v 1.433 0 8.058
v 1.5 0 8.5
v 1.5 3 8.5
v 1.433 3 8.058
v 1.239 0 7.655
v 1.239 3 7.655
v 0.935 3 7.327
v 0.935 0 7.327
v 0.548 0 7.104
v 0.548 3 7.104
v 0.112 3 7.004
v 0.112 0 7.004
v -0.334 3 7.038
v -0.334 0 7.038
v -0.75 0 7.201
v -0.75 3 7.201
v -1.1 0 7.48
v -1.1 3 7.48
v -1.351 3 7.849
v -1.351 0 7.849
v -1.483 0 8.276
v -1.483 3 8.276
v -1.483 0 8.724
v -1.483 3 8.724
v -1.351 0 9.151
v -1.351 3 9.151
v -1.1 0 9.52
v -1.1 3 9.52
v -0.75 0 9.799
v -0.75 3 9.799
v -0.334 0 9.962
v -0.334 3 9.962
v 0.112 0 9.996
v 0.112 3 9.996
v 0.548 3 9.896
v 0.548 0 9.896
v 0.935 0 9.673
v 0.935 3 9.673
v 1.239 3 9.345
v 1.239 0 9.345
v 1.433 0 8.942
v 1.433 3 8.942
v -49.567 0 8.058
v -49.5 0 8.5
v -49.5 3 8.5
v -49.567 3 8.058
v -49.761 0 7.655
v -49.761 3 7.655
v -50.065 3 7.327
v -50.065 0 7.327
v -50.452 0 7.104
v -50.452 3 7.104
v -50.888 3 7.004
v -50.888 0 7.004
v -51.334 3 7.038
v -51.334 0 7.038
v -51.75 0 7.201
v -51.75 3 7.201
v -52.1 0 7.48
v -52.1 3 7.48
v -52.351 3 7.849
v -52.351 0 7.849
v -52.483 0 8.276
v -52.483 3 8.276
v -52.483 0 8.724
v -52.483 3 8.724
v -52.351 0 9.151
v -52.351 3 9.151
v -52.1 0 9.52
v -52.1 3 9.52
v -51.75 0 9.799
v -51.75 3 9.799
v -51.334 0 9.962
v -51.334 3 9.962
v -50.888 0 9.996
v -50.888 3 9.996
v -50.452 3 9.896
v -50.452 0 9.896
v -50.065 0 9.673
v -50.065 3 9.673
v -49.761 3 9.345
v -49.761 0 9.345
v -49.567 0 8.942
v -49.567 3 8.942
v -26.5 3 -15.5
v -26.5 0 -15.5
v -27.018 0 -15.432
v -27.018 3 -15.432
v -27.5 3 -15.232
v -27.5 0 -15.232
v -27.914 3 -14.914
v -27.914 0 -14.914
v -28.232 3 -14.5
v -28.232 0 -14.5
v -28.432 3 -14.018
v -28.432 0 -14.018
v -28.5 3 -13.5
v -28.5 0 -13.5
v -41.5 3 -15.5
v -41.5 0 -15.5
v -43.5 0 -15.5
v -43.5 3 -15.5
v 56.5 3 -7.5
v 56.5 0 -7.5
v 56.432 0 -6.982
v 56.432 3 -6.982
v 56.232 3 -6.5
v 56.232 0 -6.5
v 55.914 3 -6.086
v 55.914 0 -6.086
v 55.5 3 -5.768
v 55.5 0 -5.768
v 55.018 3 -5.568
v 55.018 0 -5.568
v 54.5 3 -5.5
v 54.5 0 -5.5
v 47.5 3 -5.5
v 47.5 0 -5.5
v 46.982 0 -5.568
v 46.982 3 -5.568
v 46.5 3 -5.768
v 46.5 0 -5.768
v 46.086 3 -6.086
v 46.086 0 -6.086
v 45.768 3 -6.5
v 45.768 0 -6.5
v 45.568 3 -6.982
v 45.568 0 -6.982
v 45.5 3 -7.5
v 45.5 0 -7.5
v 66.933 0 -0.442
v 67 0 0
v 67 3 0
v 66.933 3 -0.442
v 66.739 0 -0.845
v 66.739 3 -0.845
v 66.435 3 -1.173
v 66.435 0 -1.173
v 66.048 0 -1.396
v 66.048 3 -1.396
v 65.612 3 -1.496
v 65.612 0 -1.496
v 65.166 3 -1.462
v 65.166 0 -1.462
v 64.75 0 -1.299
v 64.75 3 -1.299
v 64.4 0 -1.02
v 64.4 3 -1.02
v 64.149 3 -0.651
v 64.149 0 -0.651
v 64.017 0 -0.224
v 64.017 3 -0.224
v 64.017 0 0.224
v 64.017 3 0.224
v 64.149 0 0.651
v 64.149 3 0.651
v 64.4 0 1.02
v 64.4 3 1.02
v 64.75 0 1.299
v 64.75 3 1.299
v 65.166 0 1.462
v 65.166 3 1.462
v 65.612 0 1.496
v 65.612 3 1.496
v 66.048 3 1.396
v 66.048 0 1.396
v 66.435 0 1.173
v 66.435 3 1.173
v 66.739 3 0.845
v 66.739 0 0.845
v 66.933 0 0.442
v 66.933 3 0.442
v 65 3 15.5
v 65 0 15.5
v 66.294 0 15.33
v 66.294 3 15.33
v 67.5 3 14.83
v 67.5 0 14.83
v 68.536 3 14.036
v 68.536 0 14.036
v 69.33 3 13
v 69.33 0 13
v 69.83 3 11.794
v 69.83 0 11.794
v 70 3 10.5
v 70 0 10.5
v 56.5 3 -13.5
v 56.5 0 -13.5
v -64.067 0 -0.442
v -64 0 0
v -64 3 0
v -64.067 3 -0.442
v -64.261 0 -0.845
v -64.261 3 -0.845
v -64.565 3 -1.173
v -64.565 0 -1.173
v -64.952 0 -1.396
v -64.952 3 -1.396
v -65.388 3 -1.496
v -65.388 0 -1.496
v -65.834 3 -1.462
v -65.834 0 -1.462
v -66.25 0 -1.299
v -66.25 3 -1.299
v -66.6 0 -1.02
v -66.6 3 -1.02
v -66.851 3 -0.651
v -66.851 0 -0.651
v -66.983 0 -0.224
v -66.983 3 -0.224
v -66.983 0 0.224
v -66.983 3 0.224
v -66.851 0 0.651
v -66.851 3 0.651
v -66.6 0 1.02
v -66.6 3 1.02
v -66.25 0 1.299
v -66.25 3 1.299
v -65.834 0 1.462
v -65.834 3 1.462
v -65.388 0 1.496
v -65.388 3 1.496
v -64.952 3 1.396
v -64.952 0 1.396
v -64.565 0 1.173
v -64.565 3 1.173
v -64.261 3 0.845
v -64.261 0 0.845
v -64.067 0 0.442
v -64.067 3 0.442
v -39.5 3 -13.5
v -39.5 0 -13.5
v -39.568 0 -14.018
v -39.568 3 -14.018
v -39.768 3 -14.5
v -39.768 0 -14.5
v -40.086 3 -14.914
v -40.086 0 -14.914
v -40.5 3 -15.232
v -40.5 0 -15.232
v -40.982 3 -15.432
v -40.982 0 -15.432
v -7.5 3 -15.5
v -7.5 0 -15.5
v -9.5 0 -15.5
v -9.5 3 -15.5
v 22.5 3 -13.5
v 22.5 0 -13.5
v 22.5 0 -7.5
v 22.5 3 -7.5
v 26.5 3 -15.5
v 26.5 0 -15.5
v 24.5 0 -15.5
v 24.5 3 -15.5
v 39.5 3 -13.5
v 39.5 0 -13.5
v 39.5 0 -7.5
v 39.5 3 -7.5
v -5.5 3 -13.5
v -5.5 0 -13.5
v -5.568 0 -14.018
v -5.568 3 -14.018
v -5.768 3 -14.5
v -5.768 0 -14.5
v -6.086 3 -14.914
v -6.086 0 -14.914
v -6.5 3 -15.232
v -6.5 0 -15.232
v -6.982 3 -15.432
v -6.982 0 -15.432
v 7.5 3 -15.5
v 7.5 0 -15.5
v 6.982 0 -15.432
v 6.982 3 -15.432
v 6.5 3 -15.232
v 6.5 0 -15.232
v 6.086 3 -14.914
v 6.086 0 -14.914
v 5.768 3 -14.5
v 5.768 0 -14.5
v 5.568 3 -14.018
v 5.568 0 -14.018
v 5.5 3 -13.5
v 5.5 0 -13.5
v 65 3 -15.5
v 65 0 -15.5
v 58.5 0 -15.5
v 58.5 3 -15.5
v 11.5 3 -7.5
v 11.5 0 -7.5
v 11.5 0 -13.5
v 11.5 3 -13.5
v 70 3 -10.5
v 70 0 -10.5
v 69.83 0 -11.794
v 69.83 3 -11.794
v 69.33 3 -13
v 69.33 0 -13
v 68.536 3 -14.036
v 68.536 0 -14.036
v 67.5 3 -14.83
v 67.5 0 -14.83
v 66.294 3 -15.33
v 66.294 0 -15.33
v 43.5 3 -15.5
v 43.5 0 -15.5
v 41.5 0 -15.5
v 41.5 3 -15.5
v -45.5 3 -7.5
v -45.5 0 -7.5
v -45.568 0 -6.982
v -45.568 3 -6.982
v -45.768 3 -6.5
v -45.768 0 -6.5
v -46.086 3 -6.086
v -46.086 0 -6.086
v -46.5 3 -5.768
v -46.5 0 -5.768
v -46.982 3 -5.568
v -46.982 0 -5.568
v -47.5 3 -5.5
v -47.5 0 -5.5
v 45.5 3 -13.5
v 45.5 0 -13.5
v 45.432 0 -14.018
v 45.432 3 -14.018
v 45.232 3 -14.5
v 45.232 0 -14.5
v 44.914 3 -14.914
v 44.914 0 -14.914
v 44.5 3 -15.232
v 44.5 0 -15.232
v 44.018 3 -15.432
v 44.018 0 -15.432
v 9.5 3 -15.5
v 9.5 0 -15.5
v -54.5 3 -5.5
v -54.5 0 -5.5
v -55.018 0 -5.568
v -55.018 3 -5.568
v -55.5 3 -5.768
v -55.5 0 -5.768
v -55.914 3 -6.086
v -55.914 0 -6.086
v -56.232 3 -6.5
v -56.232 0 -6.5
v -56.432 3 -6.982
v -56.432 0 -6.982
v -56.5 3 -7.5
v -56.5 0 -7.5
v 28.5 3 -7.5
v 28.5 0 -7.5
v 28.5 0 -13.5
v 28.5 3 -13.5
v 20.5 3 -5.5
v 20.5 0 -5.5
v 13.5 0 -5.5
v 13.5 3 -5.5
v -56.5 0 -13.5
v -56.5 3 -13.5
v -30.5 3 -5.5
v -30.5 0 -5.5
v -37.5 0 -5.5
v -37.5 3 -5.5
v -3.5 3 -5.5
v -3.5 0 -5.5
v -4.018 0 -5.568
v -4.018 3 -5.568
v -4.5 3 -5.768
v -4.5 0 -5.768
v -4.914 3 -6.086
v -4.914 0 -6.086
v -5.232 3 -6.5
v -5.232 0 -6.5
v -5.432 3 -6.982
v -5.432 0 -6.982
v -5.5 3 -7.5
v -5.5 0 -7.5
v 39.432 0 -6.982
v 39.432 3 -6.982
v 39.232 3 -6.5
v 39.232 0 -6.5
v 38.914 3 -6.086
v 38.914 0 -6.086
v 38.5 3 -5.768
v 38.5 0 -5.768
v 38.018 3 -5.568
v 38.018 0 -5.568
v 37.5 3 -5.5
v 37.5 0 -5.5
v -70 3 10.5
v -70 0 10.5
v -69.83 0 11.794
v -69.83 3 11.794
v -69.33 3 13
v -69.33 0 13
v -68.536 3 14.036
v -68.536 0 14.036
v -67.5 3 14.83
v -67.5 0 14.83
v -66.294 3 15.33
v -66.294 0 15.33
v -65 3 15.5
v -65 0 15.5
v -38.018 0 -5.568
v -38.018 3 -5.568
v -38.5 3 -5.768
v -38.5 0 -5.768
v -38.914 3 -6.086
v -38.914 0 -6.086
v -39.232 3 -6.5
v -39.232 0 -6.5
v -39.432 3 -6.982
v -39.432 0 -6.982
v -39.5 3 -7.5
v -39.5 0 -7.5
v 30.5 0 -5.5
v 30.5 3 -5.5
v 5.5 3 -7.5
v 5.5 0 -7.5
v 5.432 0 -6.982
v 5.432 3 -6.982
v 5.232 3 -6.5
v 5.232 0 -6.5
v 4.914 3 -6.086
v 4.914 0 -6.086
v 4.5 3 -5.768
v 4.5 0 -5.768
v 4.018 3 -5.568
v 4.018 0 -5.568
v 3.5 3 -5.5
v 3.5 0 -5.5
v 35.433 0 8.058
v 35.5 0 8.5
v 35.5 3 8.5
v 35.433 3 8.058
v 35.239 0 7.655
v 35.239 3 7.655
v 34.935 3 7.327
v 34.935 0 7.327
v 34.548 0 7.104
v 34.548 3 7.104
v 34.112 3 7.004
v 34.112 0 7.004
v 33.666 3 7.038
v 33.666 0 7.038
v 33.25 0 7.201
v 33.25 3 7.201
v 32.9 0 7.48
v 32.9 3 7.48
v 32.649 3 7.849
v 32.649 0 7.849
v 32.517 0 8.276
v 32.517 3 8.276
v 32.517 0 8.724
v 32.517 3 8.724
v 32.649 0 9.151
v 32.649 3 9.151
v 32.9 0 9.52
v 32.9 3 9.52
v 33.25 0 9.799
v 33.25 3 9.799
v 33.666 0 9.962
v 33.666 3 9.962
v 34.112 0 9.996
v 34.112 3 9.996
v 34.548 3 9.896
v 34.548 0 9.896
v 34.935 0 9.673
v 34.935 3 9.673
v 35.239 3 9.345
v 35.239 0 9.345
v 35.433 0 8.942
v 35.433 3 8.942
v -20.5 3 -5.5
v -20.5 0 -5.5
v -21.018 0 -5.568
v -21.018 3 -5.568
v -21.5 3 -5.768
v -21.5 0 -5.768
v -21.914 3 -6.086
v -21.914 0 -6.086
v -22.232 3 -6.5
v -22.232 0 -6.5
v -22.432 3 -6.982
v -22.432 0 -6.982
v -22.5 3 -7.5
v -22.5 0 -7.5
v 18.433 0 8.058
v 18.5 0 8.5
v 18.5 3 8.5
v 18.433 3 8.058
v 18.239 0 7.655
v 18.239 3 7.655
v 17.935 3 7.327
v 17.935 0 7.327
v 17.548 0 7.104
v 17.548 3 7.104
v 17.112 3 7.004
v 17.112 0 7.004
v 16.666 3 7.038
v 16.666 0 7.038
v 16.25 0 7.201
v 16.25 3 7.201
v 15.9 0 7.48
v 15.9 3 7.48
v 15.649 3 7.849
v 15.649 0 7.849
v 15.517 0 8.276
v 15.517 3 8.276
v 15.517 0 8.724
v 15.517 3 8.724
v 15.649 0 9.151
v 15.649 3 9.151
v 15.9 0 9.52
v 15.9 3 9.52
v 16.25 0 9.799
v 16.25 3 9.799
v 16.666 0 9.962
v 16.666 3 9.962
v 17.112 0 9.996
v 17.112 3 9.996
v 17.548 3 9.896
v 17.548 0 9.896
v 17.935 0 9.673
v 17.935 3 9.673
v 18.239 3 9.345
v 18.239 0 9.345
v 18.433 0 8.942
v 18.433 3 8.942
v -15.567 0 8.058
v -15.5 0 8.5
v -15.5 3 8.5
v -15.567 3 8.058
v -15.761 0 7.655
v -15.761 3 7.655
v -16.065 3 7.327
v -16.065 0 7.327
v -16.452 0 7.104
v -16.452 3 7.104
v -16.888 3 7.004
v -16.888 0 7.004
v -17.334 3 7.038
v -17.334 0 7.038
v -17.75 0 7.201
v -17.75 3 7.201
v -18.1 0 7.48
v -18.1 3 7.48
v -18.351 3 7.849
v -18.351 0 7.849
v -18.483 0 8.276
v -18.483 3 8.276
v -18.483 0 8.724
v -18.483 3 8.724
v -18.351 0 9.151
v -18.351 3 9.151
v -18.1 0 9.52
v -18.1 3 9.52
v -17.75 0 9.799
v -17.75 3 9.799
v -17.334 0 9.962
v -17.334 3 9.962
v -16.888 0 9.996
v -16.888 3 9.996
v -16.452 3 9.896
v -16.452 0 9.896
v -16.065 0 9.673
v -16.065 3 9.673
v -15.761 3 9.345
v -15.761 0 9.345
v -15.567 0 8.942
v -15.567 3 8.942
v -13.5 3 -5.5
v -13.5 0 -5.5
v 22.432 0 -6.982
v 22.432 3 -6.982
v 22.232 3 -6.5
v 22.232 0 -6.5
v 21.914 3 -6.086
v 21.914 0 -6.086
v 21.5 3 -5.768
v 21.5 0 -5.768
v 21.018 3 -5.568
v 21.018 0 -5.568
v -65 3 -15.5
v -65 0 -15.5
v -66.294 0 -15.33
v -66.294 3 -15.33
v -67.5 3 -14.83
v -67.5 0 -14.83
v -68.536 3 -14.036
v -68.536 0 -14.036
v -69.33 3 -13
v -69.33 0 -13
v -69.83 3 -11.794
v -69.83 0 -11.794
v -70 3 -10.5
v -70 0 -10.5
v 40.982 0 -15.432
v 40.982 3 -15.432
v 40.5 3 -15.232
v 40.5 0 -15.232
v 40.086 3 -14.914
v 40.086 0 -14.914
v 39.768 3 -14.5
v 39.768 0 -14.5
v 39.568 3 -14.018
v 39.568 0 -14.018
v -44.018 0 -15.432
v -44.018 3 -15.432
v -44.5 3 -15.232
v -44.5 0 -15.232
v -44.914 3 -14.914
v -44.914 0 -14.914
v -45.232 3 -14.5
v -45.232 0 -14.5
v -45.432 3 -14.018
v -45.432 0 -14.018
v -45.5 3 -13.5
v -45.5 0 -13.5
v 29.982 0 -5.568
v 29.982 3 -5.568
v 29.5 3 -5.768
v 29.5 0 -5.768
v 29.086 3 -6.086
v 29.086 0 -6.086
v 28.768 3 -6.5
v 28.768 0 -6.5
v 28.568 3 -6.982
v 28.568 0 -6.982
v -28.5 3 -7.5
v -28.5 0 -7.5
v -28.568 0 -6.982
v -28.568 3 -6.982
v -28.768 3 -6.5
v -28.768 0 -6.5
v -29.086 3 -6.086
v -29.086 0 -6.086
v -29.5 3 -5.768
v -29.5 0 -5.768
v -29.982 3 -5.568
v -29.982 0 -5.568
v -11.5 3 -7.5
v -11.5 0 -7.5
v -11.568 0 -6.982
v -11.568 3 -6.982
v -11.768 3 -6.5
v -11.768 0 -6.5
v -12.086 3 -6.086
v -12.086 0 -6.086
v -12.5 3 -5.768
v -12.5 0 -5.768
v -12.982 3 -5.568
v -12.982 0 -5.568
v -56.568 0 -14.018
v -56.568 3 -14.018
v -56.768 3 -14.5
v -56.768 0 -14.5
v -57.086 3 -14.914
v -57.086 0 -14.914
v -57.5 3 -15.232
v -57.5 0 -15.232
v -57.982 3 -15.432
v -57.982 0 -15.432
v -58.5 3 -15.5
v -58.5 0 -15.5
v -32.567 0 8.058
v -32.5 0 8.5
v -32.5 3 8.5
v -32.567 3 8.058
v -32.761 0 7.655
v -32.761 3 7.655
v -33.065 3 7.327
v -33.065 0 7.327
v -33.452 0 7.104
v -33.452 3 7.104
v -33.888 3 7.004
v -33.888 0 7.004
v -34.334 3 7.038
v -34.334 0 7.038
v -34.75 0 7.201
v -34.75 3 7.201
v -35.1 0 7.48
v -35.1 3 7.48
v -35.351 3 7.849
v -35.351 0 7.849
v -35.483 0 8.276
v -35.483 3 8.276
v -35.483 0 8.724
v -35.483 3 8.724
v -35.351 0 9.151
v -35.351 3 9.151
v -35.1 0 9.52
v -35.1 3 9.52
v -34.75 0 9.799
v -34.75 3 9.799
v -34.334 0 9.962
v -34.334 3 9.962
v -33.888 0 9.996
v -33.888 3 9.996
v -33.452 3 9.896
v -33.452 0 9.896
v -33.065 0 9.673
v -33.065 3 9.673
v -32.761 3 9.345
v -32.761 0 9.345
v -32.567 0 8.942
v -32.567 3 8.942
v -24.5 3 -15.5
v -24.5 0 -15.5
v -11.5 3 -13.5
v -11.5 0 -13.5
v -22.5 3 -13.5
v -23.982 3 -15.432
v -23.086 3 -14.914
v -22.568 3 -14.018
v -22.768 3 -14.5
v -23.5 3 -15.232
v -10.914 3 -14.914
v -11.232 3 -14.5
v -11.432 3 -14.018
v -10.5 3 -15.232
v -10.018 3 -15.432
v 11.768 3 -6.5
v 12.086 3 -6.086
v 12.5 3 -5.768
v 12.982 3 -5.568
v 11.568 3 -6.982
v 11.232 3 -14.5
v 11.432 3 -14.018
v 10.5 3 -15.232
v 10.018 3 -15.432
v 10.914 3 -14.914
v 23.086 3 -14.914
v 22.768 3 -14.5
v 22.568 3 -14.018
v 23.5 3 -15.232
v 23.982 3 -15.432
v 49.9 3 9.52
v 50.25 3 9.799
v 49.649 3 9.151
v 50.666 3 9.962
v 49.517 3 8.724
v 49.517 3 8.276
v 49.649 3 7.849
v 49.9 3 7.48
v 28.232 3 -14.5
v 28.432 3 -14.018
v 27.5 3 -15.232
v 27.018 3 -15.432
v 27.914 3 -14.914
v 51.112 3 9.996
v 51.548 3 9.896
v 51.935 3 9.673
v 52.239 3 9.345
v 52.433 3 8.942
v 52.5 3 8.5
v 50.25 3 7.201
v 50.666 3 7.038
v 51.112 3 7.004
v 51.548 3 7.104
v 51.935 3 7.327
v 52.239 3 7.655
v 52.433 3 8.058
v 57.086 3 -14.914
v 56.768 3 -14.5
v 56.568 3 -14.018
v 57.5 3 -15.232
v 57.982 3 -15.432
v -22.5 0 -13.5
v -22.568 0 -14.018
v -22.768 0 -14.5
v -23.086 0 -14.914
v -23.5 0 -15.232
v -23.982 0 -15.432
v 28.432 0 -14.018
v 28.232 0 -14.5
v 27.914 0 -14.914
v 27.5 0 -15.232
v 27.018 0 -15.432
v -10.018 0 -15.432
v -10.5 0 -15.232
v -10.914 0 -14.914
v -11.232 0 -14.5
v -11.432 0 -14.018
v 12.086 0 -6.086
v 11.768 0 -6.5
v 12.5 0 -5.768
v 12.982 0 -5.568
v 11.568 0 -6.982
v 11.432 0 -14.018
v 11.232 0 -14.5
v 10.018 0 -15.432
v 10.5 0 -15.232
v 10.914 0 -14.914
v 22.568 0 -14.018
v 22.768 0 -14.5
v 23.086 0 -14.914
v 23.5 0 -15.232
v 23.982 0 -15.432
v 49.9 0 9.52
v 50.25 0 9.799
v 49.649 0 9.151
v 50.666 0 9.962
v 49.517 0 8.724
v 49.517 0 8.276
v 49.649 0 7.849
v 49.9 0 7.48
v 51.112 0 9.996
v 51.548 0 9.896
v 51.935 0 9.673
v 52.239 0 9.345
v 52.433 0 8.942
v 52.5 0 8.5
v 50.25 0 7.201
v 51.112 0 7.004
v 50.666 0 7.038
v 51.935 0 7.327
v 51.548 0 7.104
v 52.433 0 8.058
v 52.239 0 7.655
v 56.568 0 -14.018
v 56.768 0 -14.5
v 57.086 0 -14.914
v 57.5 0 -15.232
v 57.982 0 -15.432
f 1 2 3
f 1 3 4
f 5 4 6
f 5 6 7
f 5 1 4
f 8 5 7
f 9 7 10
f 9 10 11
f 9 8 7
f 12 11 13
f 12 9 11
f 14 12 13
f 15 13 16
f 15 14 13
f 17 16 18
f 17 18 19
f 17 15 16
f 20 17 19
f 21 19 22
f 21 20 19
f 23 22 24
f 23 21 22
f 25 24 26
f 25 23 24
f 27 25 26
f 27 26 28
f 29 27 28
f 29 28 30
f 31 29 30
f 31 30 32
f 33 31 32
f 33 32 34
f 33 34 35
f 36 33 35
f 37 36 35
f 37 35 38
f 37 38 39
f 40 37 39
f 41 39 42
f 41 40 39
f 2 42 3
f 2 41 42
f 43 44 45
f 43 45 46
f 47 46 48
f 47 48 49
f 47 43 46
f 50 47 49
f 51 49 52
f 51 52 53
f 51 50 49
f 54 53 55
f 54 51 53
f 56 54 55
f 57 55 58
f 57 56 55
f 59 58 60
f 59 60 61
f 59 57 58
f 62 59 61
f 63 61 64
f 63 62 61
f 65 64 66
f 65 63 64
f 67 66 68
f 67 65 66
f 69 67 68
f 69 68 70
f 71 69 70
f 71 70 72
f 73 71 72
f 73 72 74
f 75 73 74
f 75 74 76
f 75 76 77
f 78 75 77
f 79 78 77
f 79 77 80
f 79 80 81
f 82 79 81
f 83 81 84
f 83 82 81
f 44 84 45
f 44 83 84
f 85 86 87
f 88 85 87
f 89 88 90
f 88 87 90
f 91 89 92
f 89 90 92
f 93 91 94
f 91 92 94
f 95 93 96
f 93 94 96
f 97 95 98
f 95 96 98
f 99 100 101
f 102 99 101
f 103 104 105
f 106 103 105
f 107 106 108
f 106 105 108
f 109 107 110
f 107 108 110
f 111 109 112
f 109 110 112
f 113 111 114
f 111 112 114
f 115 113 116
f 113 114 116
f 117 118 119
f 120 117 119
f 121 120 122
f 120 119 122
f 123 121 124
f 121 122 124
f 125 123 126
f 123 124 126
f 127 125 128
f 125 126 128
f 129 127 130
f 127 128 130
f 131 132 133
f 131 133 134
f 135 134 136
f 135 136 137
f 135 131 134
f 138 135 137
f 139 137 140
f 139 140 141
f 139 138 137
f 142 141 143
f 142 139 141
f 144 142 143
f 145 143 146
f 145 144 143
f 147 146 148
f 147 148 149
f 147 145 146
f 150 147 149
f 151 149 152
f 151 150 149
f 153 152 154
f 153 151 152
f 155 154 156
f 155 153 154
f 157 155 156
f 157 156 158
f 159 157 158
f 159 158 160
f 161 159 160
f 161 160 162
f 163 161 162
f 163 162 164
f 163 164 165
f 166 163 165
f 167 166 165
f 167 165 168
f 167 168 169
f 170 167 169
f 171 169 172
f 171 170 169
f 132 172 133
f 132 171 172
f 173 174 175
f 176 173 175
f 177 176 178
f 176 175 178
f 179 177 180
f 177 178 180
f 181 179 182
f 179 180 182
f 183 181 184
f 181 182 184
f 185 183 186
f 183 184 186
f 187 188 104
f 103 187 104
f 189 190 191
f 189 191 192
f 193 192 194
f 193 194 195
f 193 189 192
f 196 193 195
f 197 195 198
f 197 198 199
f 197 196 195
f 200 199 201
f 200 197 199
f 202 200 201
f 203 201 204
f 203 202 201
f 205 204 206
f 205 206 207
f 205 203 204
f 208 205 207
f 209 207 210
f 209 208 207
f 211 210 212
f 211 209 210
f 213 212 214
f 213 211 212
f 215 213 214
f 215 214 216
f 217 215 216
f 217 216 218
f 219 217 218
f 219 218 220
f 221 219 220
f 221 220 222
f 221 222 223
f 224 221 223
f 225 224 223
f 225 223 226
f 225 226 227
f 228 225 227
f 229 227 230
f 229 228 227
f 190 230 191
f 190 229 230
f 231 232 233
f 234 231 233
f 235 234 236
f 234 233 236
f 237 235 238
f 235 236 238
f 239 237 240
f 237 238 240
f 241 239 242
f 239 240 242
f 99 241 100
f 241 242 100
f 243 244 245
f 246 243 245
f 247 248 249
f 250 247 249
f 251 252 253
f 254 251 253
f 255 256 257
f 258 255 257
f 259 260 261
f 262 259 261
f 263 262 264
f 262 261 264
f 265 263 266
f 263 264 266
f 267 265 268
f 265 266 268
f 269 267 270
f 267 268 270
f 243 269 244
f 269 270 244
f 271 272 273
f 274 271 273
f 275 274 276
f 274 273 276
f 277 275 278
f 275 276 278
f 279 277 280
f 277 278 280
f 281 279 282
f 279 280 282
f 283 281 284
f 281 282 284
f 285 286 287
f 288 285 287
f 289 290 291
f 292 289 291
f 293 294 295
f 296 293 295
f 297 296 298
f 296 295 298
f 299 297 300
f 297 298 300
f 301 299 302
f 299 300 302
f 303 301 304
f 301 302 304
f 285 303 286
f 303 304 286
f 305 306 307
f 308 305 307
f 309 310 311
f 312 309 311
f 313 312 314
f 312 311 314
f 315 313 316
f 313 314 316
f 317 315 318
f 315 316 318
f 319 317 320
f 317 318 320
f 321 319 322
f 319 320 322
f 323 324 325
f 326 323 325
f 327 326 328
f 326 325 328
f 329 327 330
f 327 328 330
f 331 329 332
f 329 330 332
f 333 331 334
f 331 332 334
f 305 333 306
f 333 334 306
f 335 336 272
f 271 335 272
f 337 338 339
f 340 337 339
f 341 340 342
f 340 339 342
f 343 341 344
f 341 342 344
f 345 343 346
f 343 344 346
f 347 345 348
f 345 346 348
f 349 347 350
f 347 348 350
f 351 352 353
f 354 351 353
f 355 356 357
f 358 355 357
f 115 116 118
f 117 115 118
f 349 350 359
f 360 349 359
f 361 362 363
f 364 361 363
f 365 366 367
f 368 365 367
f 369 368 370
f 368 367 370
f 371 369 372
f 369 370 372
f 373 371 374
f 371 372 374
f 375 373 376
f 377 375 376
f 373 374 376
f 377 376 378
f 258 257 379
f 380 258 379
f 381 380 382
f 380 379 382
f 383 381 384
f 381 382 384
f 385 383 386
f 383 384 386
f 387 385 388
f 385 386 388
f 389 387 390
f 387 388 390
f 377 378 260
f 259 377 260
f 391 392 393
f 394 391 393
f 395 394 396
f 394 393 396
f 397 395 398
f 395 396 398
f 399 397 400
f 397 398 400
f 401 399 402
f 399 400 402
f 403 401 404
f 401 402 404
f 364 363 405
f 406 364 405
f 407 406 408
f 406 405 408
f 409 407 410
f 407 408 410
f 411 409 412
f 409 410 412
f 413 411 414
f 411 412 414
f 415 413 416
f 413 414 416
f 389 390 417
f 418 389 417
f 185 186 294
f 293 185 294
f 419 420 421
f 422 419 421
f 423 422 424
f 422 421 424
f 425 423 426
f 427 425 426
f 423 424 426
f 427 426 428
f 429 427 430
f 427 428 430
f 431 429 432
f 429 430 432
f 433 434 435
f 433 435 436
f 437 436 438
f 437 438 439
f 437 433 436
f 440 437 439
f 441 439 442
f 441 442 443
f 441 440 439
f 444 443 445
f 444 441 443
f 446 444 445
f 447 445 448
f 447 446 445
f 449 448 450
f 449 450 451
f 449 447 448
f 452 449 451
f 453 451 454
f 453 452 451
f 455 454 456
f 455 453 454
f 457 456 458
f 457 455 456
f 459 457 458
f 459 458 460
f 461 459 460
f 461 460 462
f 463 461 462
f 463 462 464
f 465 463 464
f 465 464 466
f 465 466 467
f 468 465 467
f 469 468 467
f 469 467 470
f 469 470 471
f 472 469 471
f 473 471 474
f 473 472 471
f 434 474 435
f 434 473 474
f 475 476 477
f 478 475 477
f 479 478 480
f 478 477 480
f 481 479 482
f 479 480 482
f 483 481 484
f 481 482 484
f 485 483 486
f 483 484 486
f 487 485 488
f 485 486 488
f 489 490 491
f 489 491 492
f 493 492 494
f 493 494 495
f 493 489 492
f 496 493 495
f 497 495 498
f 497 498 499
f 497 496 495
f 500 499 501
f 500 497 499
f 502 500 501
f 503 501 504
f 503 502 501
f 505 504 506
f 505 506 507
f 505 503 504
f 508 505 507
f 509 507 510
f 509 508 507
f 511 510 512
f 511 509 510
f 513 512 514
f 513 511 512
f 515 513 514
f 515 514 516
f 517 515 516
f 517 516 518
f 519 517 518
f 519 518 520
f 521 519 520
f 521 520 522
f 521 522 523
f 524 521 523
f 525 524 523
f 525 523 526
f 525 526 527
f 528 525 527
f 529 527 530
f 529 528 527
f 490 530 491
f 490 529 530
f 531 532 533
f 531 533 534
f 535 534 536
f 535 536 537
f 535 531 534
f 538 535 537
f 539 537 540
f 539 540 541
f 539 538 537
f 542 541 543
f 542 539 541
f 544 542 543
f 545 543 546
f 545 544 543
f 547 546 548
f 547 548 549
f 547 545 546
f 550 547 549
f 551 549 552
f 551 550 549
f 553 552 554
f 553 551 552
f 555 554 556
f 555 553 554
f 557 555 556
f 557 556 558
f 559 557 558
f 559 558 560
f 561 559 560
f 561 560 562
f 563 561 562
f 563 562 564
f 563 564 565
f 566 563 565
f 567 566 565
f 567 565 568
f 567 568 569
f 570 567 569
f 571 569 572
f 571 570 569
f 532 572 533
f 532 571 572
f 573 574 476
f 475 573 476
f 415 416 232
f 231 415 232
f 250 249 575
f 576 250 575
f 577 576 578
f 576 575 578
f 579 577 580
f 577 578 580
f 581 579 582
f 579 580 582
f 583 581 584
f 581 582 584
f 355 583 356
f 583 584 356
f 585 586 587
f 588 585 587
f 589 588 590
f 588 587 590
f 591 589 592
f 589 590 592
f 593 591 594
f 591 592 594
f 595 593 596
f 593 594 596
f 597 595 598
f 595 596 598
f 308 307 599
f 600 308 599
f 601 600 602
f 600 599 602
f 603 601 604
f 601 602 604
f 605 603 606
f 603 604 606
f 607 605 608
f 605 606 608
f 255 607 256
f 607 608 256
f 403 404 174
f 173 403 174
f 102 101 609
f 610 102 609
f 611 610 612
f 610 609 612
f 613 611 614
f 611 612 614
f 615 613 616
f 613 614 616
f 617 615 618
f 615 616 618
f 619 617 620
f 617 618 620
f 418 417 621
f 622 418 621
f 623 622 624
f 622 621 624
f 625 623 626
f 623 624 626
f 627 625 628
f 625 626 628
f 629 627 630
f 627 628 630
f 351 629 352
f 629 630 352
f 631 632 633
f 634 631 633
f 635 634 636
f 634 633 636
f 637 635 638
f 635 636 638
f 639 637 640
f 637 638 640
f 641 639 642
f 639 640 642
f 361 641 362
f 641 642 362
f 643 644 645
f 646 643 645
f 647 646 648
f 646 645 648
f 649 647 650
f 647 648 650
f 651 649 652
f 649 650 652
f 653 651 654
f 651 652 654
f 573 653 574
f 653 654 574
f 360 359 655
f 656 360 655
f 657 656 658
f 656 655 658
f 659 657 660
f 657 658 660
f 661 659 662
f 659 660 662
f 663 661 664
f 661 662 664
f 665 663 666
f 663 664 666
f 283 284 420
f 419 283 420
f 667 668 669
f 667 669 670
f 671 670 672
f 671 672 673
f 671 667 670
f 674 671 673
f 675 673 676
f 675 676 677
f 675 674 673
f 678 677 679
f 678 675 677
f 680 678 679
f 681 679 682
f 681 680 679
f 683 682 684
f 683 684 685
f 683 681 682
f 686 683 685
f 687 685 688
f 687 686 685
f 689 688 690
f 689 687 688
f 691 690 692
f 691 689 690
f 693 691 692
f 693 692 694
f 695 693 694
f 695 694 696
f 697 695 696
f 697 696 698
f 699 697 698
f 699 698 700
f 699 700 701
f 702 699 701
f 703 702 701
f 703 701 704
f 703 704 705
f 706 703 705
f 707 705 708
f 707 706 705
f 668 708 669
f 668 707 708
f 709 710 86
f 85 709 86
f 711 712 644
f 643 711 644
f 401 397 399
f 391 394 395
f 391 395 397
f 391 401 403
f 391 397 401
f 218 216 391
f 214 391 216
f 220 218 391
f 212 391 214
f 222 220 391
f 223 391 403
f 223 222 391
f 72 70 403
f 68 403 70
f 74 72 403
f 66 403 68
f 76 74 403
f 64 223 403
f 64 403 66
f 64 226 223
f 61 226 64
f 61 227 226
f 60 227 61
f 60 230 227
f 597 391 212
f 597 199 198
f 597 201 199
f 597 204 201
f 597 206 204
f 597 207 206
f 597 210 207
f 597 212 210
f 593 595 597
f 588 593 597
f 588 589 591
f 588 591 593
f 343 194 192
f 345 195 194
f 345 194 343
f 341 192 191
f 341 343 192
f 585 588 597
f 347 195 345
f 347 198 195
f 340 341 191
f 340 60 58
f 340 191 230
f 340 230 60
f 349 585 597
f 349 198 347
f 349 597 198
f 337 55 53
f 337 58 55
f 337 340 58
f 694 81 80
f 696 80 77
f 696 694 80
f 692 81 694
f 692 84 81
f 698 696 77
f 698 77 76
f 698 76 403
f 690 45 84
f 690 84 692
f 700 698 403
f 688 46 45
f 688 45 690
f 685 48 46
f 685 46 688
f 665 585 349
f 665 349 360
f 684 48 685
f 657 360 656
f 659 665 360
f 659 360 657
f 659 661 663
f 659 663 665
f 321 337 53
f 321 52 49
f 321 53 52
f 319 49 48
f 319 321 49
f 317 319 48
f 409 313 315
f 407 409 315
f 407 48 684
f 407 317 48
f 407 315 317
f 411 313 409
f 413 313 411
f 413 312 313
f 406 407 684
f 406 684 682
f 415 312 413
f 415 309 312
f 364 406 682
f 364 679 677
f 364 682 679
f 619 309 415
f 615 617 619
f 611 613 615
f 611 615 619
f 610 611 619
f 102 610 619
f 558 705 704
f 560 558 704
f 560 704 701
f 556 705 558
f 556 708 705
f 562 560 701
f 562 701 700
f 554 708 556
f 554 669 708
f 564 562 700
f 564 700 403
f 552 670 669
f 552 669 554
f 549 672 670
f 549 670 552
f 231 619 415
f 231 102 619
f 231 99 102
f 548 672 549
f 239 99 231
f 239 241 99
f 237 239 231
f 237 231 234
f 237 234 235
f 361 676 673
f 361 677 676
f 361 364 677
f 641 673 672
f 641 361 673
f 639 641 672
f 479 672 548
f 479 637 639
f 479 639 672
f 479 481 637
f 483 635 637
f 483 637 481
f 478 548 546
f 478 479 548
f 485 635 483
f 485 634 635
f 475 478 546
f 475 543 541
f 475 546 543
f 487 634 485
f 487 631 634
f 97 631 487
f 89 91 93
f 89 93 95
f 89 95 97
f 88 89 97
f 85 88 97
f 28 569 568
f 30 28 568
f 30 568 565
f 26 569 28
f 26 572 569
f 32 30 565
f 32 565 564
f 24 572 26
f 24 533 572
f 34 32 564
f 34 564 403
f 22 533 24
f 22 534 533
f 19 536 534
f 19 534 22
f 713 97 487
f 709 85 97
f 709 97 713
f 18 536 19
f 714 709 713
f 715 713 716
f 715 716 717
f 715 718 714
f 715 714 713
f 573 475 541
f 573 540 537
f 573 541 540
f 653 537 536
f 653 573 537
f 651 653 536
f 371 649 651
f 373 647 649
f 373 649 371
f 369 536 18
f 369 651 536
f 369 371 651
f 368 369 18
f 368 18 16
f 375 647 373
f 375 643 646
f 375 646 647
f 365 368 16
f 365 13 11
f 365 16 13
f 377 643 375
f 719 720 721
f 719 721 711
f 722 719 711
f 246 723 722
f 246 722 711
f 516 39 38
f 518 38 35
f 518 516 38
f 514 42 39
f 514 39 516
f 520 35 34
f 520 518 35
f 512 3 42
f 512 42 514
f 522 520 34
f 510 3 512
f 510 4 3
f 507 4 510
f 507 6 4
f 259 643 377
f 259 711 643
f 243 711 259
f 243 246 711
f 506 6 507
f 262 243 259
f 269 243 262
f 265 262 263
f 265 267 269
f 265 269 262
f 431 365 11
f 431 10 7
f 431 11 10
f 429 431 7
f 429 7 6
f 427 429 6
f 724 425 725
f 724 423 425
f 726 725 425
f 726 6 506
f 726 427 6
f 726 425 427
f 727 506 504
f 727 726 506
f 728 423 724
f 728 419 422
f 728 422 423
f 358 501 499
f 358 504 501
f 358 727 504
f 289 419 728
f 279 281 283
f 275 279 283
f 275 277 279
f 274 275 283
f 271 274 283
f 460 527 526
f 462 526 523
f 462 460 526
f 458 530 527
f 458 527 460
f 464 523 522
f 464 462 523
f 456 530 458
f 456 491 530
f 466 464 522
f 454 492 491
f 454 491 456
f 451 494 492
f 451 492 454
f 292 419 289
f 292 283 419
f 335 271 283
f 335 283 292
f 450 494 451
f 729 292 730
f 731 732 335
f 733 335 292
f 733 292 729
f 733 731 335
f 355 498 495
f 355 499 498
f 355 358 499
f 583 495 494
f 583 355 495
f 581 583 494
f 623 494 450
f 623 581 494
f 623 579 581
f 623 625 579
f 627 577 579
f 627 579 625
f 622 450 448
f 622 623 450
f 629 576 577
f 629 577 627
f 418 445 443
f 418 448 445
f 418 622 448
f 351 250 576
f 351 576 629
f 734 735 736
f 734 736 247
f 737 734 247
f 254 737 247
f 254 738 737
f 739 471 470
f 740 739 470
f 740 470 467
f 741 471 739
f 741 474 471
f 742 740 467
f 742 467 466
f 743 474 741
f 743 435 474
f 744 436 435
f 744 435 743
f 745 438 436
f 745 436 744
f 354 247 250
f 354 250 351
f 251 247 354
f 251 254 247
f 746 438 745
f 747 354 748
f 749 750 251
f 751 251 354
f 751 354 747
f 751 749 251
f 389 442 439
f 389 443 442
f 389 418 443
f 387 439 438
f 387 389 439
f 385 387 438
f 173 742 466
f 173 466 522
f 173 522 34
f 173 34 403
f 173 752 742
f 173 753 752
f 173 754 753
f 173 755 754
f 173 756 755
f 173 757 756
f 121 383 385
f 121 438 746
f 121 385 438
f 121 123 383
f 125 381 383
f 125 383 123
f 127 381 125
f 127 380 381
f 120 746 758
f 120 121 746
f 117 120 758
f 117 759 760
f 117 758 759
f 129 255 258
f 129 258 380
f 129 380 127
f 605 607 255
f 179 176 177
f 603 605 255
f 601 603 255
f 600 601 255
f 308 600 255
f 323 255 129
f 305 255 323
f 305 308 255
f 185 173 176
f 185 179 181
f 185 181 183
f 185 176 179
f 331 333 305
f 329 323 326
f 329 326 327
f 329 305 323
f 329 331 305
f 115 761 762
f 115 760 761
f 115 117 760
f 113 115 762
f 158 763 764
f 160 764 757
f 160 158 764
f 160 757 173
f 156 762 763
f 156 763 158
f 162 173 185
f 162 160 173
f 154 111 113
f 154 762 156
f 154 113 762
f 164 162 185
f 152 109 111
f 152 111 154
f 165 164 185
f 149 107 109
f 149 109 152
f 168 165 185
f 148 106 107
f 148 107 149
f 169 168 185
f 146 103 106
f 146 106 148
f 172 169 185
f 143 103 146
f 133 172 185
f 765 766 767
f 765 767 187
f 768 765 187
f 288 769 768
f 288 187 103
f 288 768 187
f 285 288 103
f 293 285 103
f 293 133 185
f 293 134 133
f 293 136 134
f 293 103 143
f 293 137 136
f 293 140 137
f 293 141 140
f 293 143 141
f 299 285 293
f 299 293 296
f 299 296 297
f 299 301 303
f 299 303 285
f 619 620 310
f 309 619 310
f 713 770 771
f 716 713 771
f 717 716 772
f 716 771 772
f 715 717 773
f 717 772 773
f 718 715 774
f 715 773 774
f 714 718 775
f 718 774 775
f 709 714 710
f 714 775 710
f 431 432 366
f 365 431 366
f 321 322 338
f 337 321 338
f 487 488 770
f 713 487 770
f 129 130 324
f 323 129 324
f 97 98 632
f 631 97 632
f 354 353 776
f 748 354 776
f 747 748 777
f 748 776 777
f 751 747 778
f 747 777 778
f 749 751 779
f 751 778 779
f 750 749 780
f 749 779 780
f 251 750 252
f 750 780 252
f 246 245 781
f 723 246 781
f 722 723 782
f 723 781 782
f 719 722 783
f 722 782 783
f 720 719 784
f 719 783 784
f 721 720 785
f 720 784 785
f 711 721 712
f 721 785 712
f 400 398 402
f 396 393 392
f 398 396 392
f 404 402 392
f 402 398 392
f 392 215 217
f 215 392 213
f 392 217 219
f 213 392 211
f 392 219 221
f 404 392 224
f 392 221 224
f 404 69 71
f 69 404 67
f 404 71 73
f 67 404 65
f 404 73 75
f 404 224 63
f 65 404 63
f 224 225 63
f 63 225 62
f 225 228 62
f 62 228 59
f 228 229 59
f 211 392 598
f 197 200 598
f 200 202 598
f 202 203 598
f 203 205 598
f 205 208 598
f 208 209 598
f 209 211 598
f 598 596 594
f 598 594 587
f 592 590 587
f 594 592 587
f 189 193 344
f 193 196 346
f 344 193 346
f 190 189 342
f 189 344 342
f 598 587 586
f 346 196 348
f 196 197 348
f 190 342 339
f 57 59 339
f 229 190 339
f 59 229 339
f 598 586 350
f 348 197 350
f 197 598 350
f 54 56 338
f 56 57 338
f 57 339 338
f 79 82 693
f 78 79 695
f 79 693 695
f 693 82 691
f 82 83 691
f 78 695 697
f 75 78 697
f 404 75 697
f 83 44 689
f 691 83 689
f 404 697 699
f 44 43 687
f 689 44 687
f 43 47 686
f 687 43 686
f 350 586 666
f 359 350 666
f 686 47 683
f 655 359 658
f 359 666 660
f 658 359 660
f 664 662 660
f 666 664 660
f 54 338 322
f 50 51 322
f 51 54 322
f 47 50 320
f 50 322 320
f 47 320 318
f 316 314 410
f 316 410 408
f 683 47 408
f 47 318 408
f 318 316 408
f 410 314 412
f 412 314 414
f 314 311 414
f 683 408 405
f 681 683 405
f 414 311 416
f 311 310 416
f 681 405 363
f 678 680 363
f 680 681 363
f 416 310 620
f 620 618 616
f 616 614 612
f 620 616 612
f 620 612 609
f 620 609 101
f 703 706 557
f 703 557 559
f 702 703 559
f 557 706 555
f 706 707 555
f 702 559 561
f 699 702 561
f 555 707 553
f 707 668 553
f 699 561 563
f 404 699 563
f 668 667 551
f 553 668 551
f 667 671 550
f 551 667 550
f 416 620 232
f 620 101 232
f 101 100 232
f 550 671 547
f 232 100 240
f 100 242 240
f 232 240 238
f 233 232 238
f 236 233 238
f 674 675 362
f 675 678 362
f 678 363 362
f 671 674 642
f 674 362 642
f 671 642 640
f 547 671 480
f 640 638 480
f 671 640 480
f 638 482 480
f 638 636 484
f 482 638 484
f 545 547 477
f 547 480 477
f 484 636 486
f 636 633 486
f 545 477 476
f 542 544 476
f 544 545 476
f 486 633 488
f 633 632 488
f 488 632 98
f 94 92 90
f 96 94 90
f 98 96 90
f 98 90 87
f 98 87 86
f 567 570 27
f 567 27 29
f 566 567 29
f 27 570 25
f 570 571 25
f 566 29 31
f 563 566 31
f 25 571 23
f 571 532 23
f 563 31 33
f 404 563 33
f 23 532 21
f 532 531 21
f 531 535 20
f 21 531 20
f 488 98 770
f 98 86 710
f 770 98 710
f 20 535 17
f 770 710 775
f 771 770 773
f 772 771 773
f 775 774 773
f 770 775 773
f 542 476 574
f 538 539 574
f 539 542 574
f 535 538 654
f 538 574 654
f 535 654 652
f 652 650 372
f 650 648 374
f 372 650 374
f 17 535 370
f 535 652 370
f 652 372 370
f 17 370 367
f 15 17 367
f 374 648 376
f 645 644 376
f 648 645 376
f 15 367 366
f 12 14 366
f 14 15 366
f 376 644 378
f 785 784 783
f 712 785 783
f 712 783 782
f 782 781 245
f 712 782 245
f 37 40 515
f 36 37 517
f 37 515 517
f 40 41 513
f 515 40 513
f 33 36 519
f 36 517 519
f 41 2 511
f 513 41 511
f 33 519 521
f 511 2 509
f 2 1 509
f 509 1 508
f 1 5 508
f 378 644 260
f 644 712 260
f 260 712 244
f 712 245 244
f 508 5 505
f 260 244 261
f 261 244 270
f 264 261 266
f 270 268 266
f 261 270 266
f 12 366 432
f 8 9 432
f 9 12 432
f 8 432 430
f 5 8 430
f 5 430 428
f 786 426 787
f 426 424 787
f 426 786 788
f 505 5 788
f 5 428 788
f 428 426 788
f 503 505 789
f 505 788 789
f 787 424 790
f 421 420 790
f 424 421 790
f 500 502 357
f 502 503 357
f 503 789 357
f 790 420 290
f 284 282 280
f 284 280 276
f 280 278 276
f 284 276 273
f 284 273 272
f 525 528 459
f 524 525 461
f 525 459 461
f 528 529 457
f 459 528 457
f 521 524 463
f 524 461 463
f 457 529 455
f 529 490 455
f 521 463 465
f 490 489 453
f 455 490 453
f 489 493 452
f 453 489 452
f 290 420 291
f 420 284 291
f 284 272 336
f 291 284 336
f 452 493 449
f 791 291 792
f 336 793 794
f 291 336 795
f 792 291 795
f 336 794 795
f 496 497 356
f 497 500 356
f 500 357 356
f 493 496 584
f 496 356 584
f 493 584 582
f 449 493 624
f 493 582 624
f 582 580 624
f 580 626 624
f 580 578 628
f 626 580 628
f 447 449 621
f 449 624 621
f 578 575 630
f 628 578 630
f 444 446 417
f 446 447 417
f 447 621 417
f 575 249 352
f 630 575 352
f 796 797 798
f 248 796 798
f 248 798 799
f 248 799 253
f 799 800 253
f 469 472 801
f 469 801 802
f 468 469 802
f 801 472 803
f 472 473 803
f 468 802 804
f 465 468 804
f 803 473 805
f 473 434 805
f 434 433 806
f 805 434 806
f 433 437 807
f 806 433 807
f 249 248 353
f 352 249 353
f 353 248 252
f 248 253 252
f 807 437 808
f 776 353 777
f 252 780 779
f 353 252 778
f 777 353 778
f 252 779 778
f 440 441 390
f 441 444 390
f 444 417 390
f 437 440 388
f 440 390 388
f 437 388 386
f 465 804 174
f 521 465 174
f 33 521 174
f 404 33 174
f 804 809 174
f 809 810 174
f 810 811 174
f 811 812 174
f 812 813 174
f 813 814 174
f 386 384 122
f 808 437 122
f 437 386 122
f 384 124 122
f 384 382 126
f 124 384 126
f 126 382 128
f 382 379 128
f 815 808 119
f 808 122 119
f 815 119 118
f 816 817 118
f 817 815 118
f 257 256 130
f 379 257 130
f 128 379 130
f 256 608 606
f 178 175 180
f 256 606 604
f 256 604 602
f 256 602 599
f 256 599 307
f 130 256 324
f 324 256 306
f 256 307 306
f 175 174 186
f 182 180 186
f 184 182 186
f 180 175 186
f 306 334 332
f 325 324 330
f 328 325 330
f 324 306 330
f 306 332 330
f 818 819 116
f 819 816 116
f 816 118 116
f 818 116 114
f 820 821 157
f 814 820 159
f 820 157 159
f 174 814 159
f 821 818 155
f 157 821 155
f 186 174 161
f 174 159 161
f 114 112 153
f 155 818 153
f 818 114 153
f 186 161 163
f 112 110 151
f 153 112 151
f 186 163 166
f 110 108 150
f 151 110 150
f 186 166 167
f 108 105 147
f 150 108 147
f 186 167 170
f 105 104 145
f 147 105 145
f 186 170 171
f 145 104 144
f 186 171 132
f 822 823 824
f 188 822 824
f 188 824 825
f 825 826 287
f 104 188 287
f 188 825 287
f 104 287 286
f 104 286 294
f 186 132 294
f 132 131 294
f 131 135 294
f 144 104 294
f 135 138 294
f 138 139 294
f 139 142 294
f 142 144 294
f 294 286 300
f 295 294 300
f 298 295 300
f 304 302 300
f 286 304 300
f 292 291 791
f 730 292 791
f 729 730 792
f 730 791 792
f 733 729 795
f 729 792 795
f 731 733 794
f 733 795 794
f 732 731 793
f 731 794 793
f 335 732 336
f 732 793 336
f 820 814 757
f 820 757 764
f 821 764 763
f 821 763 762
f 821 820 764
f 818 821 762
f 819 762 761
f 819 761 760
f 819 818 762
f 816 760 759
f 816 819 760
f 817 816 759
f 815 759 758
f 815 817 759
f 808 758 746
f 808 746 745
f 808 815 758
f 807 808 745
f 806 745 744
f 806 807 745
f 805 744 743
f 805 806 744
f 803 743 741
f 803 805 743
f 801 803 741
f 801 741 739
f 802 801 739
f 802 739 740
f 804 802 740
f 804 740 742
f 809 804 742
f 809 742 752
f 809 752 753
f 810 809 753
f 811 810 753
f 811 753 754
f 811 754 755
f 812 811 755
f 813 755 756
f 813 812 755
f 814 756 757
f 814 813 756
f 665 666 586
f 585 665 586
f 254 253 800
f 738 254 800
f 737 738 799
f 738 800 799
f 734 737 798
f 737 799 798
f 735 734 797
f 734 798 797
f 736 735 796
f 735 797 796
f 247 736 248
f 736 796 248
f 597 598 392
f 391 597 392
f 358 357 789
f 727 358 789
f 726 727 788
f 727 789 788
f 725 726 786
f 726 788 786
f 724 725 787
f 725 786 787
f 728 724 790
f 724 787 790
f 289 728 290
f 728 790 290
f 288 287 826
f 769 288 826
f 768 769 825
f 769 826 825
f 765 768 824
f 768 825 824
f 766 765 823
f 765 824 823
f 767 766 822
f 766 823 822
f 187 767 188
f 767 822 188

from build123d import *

# Parameters (mm, degrees)
SKETCH1_R           = 1.5
BOSS_EXTRUDE1_DEPTH = 3


with BuildPart() as part:
    # Sketch1 → Boss-Extrude1 (new body)
    with BuildSketch(Plane(origin=(0, 0, 0), x_dir=(1, 0, 0), z_dir=(0, 1, 0))):
        with BuildLine():
            Line((65, 15.5), (58.5, 15.5))
            ThreePointArc((58.5, 15.5), (57.085786438, 14.914213562), (56.5, 13.5))
            Line((56.5, 13.5), (56.5, 7.5))
            ThreePointArc((56.5, 7.5), (55.914213562, 6.085786438), (54.5, 5.5))
            Line((54.5, 5.5), (47.5, 5.5))
            ThreePointArc((47.5, 5.5), (46.085786438, 6.085786438), (45.5, 7.5))
            Line((45.5, 7.5), (45.5, 13.5))
            ThreePointArc((45.5, 13.5), (44.914213562, 14.914213562), (43.5, 15.5))
            Line((43.5, 15.5), (41.5, 15.5))
            ThreePointArc((41.5, 15.5), (40.085786438, 14.914213562), (39.5, 13.5))
            Line((39.5, 13.5), (39.5, 7.5))
            ThreePointArc((39.5, 7.5), (38.914213562, 6.085786438), (37.5, 5.5))
            Line((37.5, 5.5), (30.5, 5.5))
            ThreePointArc((30.5, 5.5), (29.085786438, 6.085786438), (28.5, 7.5))
            Line((28.5, 7.5), (28.5, 13.5))
            ThreePointArc((28.5, 13.5), (27.914213562, 14.914213562), (26.5, 15.5))
            Line((26.5, 15.5), (24.5, 15.5))
            ThreePointArc((24.5, 15.5), (23.085786438, 14.914213562), (22.5, 13.5))
            Line((22.5, 13.5), (22.5, 7.5))
            ThreePointArc((22.5, 7.5), (21.914213562, 6.085786438), (20.5, 5.5))
            Line((20.5, 5.5), (13.5, 5.5))
            ThreePointArc((13.5, 5.5), (12.085786438, 6.085786438), (11.5, 7.5))
            Line((11.5, 7.5), (11.5, 13.5))
            ThreePointArc((11.5, 13.5), (10.914213562, 14.914213562), (9.5, 15.5))
            Line((9.5, 15.5), (7.5, 15.5))
            ThreePointArc((7.5, 15.5), (6.085786438, 14.914213562), (5.5, 13.5))
            Line((5.5, 13.5), (5.5, 7.5))
            ThreePointArc((5.5, 7.5), (4.914213562, 6.085786438), (3.5, 5.5))
            Line((3.5, 5.5), (-3.5, 5.5))
            ThreePointArc((-3.5, 5.5), (-4.914213562, 6.085786438), (-5.5, 7.5))
            Line((-5.5, 7.5), (-5.5, 13.5))
            ThreePointArc((-5.5, 13.5), (-6.085786438, 14.914213562), (-7.5, 15.5))
            Line((-7.5, 15.5), (-9.5, 15.5))
            ThreePointArc((-9.5, 15.5), (-10.914213562, 14.914213562), (-11.5, 13.5))
            Line((-11.5, 13.5), (-11.5, 7.5))
            ThreePointArc((-11.5, 7.5), (-12.085786438, 6.085786438), (-13.5, 5.5))
            Line((-13.5, 5.5), (-20.5, 5.5))
            ThreePointArc((-20.5, 5.5), (-21.914213562, 6.085786438), (-22.5, 7.5))
            Line((-22.5, 7.5), (-22.5, 13.5))
            ThreePointArc((-22.5, 13.5), (-23.085786438, 14.914213562), (-24.5, 15.5))
            Line((-24.5, 15.5), (-26.5, 15.5))
            ThreePointArc((-26.5, 15.5), (-27.914213562, 14.914213562), (-28.5, 13.5))
            Line((-28.5, 13.5), (-28.5, 7.5))
            ThreePointArc((-28.5, 7.5), (-29.085786438, 6.085786438), (-30.5, 5.5))
            Line((-30.5, 5.5), (-37.5, 5.5))
            ThreePointArc((-37.5, 5.5), (-38.914213562, 6.085786438), (-39.5, 7.5))
            Line((-39.5, 7.5), (-39.5, 13.5))
            ThreePointArc((-39.5, 13.5), (-40.085786438, 14.914213562), (-41.5, 15.5))
            Line((-41.5, 15.5), (-43.5, 15.5))
            ThreePointArc((-43.5, 15.5), (-44.914213562, 14.914213562), (-45.5, 13.5))
            Line((-45.5, 13.5), (-45.5, 7.5))
            ThreePointArc((-45.5, 7.5), (-46.085786438, 6.085786438), (-47.5, 5.5))
            Line((-47.5, 5.5), (-54.5, 5.5))
            ThreePointArc((-54.5, 5.5), (-55.914213562, 6.085786438), (-56.5, 7.5))
            Line((-56.5, 7.5), (-56.5, 13.5))
            ThreePointArc((-56.5, 13.5), (-57.085786438, 14.914213562), (-58.5, 15.5))
            Line((-58.5, 15.5), (-65, 15.5))
            ThreePointArc((-65, 15.5), (-68.535533906, 14.035533906), (-70, 10.5))
            Line((-70, 10.5), (-70, -10.5))
            ThreePointArc((-70, -10.5), (-68.535533906, -14.035533906), (-65, -15.5))
            Line((-65, -15.5), (65, -15.5))
            ThreePointArc((65, -15.5), (68.535533906, -14.035533906), (70, -10.5))
            Line((70, -10.5), (70, 10.5))
            ThreePointArc((70, 10.5), (68.535533906, 14.035533906), (65, 15.5))
        make_face()
        with Locations((-65.5, 0)):
            Circle(SKETCH1_R, mode=Mode.SUBTRACT)
        with Locations((65.5, 0)):
            Circle(SKETCH1_R, mode=Mode.SUBTRACT)
        with Locations((-51, -8.5)):
            Circle(SKETCH1_R, mode=Mode.SUBTRACT)
        with Locations((-34, -8.5)):
            Circle(SKETCH1_R, mode=Mode.SUBTRACT)
        with Locations((-17, -8.5)):
            Circle(SKETCH1_R, mode=Mode.SUBTRACT)
        with Locations((0, -8.5)):
            Circle(SKETCH1_R, mode=Mode.SUBTRACT)
        with Locations((17, -8.5)):
            Circle(SKETCH1_R, mode=Mode.SUBTRACT)
        with Locations((34, -8.5)):
            Circle(SKETCH1_R, mode=Mode.SUBTRACT)
        with Locations((51, -8.5)):
            Circle(SKETCH1_R, mode=Mode.SUBTRACT)
    extrude(amount=BOSS_EXTRUDE1_DEPTH)


solid = part.part
